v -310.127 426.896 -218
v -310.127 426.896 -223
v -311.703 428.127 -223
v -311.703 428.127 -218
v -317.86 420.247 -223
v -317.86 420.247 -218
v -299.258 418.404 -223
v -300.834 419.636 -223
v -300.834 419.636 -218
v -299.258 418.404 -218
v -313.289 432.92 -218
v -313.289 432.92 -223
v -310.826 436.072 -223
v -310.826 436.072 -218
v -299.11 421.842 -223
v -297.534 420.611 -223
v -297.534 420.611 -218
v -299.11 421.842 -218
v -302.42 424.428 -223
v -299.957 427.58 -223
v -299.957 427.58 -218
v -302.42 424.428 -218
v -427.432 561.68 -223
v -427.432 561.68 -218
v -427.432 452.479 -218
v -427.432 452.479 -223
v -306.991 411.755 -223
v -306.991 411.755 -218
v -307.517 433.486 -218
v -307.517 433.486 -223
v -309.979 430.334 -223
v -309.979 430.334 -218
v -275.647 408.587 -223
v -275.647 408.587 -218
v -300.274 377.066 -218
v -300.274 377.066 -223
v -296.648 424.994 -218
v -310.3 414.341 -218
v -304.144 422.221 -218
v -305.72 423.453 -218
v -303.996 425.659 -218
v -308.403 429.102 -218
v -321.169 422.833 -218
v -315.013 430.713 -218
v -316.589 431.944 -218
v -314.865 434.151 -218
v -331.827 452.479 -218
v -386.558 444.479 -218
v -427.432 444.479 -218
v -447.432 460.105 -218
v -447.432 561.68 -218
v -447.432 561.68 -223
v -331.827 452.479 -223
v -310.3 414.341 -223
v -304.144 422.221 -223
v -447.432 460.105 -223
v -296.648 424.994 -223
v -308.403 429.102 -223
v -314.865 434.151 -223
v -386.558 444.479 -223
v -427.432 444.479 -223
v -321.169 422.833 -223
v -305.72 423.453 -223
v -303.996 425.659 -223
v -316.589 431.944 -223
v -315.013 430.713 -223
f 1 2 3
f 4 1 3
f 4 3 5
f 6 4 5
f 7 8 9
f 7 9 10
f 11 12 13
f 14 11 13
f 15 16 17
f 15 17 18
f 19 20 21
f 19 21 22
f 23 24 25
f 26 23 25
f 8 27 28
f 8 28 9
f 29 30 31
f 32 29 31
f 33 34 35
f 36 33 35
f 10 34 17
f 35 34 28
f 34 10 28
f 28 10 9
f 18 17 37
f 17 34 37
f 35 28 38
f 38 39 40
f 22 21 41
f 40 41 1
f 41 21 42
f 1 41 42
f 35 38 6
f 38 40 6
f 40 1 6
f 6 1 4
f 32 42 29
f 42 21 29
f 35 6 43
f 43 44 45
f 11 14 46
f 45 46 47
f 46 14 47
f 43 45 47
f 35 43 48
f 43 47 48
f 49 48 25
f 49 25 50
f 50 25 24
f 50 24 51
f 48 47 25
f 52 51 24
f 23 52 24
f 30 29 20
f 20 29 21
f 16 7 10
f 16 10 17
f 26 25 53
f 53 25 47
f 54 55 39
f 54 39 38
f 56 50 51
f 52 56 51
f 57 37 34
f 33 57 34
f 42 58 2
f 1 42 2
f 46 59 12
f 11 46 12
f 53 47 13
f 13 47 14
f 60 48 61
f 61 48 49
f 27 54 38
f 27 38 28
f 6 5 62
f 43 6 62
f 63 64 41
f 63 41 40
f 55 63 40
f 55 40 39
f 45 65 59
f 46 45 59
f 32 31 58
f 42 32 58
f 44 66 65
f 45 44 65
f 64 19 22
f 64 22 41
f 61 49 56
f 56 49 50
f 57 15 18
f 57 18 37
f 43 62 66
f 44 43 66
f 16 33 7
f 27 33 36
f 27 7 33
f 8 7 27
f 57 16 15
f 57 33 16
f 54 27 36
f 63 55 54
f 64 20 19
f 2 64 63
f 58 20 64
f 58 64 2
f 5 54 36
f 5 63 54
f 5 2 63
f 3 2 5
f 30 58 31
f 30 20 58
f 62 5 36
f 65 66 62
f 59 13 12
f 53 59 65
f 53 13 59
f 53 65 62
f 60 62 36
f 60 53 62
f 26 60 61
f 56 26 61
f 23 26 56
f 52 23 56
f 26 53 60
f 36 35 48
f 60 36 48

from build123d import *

# Parameters (mm, degrees)
BOSS_EXTRUDE1_DEPTH     = 5
CUT_EXTRUDE1_DEPTH      = 1
CUT_EXTRUDE1_DEPTH_BACK = 6


with BuildPart() as part:
    # Sketch3 → Boss-Extrude1 (new body)
    with BuildSketch(Plane.XY.offset(-218)):
        Polygon((-331.826668729, 452.47886283), (-275.647209147, 408.586658554), (-300.273668161, 377.066228409), (-386.557905491, 444.47886283), (-427.432442284, 444.47886283), (-447.432442284, 460.10457536), (-447.432442284, 561.679955314), (-427.432442284, 561.679955314), (-427.432442284, 452.47886283), align=None)
    extrude(amount=-BOSS_EXTRUDE1_DEPTH)

    # Sketch4 → Cut-Extrude1 (cut, two sides)
    with BuildSketch(Plane(origin=(0, 0, -223), x_dir=(-1, 0, 0), z_dir=(0, 0, -1))) as cut_extrude1_sk:
        Polygon((296.647620515, 424.993978106), (299.95726568, 427.579756302), (302.419911581, 424.427713288), (303.995933089, 425.659036238), (305.71978522, 423.452606128), (304.143763712, 422.221283178), (310.300378466, 414.341175642), (306.990733301, 411.755397445), (300.834118547, 419.635504981), (299.25809704, 418.404182031), (297.534244909, 420.610612141), (299.110266416, 421.841935091), align=None)
        Polygon((309.979258098, 430.333722067), (308.40323659, 429.102399116), (310.127088721, 426.895969006), (311.703110229, 428.127291957), (317.859724982, 420.24718442), (321.169370147, 422.832962617), (315.012755394, 430.713070153), (316.588776901, 431.944393104), (314.86492477, 434.150823214), (313.288903263, 432.919500263), (310.826257361, 436.071543277), (307.516612196, 433.485765081), align=None)
    extrude(amount=CUT_EXTRUDE1_DEPTH, mode=Mode.SUBTRACT)
    extrude(cut_extrude1_sk.sketch, amount=-CUT_EXTRUDE1_DEPTH_BACK, mode=Mode.SUBTRACT)


solid = part.part
